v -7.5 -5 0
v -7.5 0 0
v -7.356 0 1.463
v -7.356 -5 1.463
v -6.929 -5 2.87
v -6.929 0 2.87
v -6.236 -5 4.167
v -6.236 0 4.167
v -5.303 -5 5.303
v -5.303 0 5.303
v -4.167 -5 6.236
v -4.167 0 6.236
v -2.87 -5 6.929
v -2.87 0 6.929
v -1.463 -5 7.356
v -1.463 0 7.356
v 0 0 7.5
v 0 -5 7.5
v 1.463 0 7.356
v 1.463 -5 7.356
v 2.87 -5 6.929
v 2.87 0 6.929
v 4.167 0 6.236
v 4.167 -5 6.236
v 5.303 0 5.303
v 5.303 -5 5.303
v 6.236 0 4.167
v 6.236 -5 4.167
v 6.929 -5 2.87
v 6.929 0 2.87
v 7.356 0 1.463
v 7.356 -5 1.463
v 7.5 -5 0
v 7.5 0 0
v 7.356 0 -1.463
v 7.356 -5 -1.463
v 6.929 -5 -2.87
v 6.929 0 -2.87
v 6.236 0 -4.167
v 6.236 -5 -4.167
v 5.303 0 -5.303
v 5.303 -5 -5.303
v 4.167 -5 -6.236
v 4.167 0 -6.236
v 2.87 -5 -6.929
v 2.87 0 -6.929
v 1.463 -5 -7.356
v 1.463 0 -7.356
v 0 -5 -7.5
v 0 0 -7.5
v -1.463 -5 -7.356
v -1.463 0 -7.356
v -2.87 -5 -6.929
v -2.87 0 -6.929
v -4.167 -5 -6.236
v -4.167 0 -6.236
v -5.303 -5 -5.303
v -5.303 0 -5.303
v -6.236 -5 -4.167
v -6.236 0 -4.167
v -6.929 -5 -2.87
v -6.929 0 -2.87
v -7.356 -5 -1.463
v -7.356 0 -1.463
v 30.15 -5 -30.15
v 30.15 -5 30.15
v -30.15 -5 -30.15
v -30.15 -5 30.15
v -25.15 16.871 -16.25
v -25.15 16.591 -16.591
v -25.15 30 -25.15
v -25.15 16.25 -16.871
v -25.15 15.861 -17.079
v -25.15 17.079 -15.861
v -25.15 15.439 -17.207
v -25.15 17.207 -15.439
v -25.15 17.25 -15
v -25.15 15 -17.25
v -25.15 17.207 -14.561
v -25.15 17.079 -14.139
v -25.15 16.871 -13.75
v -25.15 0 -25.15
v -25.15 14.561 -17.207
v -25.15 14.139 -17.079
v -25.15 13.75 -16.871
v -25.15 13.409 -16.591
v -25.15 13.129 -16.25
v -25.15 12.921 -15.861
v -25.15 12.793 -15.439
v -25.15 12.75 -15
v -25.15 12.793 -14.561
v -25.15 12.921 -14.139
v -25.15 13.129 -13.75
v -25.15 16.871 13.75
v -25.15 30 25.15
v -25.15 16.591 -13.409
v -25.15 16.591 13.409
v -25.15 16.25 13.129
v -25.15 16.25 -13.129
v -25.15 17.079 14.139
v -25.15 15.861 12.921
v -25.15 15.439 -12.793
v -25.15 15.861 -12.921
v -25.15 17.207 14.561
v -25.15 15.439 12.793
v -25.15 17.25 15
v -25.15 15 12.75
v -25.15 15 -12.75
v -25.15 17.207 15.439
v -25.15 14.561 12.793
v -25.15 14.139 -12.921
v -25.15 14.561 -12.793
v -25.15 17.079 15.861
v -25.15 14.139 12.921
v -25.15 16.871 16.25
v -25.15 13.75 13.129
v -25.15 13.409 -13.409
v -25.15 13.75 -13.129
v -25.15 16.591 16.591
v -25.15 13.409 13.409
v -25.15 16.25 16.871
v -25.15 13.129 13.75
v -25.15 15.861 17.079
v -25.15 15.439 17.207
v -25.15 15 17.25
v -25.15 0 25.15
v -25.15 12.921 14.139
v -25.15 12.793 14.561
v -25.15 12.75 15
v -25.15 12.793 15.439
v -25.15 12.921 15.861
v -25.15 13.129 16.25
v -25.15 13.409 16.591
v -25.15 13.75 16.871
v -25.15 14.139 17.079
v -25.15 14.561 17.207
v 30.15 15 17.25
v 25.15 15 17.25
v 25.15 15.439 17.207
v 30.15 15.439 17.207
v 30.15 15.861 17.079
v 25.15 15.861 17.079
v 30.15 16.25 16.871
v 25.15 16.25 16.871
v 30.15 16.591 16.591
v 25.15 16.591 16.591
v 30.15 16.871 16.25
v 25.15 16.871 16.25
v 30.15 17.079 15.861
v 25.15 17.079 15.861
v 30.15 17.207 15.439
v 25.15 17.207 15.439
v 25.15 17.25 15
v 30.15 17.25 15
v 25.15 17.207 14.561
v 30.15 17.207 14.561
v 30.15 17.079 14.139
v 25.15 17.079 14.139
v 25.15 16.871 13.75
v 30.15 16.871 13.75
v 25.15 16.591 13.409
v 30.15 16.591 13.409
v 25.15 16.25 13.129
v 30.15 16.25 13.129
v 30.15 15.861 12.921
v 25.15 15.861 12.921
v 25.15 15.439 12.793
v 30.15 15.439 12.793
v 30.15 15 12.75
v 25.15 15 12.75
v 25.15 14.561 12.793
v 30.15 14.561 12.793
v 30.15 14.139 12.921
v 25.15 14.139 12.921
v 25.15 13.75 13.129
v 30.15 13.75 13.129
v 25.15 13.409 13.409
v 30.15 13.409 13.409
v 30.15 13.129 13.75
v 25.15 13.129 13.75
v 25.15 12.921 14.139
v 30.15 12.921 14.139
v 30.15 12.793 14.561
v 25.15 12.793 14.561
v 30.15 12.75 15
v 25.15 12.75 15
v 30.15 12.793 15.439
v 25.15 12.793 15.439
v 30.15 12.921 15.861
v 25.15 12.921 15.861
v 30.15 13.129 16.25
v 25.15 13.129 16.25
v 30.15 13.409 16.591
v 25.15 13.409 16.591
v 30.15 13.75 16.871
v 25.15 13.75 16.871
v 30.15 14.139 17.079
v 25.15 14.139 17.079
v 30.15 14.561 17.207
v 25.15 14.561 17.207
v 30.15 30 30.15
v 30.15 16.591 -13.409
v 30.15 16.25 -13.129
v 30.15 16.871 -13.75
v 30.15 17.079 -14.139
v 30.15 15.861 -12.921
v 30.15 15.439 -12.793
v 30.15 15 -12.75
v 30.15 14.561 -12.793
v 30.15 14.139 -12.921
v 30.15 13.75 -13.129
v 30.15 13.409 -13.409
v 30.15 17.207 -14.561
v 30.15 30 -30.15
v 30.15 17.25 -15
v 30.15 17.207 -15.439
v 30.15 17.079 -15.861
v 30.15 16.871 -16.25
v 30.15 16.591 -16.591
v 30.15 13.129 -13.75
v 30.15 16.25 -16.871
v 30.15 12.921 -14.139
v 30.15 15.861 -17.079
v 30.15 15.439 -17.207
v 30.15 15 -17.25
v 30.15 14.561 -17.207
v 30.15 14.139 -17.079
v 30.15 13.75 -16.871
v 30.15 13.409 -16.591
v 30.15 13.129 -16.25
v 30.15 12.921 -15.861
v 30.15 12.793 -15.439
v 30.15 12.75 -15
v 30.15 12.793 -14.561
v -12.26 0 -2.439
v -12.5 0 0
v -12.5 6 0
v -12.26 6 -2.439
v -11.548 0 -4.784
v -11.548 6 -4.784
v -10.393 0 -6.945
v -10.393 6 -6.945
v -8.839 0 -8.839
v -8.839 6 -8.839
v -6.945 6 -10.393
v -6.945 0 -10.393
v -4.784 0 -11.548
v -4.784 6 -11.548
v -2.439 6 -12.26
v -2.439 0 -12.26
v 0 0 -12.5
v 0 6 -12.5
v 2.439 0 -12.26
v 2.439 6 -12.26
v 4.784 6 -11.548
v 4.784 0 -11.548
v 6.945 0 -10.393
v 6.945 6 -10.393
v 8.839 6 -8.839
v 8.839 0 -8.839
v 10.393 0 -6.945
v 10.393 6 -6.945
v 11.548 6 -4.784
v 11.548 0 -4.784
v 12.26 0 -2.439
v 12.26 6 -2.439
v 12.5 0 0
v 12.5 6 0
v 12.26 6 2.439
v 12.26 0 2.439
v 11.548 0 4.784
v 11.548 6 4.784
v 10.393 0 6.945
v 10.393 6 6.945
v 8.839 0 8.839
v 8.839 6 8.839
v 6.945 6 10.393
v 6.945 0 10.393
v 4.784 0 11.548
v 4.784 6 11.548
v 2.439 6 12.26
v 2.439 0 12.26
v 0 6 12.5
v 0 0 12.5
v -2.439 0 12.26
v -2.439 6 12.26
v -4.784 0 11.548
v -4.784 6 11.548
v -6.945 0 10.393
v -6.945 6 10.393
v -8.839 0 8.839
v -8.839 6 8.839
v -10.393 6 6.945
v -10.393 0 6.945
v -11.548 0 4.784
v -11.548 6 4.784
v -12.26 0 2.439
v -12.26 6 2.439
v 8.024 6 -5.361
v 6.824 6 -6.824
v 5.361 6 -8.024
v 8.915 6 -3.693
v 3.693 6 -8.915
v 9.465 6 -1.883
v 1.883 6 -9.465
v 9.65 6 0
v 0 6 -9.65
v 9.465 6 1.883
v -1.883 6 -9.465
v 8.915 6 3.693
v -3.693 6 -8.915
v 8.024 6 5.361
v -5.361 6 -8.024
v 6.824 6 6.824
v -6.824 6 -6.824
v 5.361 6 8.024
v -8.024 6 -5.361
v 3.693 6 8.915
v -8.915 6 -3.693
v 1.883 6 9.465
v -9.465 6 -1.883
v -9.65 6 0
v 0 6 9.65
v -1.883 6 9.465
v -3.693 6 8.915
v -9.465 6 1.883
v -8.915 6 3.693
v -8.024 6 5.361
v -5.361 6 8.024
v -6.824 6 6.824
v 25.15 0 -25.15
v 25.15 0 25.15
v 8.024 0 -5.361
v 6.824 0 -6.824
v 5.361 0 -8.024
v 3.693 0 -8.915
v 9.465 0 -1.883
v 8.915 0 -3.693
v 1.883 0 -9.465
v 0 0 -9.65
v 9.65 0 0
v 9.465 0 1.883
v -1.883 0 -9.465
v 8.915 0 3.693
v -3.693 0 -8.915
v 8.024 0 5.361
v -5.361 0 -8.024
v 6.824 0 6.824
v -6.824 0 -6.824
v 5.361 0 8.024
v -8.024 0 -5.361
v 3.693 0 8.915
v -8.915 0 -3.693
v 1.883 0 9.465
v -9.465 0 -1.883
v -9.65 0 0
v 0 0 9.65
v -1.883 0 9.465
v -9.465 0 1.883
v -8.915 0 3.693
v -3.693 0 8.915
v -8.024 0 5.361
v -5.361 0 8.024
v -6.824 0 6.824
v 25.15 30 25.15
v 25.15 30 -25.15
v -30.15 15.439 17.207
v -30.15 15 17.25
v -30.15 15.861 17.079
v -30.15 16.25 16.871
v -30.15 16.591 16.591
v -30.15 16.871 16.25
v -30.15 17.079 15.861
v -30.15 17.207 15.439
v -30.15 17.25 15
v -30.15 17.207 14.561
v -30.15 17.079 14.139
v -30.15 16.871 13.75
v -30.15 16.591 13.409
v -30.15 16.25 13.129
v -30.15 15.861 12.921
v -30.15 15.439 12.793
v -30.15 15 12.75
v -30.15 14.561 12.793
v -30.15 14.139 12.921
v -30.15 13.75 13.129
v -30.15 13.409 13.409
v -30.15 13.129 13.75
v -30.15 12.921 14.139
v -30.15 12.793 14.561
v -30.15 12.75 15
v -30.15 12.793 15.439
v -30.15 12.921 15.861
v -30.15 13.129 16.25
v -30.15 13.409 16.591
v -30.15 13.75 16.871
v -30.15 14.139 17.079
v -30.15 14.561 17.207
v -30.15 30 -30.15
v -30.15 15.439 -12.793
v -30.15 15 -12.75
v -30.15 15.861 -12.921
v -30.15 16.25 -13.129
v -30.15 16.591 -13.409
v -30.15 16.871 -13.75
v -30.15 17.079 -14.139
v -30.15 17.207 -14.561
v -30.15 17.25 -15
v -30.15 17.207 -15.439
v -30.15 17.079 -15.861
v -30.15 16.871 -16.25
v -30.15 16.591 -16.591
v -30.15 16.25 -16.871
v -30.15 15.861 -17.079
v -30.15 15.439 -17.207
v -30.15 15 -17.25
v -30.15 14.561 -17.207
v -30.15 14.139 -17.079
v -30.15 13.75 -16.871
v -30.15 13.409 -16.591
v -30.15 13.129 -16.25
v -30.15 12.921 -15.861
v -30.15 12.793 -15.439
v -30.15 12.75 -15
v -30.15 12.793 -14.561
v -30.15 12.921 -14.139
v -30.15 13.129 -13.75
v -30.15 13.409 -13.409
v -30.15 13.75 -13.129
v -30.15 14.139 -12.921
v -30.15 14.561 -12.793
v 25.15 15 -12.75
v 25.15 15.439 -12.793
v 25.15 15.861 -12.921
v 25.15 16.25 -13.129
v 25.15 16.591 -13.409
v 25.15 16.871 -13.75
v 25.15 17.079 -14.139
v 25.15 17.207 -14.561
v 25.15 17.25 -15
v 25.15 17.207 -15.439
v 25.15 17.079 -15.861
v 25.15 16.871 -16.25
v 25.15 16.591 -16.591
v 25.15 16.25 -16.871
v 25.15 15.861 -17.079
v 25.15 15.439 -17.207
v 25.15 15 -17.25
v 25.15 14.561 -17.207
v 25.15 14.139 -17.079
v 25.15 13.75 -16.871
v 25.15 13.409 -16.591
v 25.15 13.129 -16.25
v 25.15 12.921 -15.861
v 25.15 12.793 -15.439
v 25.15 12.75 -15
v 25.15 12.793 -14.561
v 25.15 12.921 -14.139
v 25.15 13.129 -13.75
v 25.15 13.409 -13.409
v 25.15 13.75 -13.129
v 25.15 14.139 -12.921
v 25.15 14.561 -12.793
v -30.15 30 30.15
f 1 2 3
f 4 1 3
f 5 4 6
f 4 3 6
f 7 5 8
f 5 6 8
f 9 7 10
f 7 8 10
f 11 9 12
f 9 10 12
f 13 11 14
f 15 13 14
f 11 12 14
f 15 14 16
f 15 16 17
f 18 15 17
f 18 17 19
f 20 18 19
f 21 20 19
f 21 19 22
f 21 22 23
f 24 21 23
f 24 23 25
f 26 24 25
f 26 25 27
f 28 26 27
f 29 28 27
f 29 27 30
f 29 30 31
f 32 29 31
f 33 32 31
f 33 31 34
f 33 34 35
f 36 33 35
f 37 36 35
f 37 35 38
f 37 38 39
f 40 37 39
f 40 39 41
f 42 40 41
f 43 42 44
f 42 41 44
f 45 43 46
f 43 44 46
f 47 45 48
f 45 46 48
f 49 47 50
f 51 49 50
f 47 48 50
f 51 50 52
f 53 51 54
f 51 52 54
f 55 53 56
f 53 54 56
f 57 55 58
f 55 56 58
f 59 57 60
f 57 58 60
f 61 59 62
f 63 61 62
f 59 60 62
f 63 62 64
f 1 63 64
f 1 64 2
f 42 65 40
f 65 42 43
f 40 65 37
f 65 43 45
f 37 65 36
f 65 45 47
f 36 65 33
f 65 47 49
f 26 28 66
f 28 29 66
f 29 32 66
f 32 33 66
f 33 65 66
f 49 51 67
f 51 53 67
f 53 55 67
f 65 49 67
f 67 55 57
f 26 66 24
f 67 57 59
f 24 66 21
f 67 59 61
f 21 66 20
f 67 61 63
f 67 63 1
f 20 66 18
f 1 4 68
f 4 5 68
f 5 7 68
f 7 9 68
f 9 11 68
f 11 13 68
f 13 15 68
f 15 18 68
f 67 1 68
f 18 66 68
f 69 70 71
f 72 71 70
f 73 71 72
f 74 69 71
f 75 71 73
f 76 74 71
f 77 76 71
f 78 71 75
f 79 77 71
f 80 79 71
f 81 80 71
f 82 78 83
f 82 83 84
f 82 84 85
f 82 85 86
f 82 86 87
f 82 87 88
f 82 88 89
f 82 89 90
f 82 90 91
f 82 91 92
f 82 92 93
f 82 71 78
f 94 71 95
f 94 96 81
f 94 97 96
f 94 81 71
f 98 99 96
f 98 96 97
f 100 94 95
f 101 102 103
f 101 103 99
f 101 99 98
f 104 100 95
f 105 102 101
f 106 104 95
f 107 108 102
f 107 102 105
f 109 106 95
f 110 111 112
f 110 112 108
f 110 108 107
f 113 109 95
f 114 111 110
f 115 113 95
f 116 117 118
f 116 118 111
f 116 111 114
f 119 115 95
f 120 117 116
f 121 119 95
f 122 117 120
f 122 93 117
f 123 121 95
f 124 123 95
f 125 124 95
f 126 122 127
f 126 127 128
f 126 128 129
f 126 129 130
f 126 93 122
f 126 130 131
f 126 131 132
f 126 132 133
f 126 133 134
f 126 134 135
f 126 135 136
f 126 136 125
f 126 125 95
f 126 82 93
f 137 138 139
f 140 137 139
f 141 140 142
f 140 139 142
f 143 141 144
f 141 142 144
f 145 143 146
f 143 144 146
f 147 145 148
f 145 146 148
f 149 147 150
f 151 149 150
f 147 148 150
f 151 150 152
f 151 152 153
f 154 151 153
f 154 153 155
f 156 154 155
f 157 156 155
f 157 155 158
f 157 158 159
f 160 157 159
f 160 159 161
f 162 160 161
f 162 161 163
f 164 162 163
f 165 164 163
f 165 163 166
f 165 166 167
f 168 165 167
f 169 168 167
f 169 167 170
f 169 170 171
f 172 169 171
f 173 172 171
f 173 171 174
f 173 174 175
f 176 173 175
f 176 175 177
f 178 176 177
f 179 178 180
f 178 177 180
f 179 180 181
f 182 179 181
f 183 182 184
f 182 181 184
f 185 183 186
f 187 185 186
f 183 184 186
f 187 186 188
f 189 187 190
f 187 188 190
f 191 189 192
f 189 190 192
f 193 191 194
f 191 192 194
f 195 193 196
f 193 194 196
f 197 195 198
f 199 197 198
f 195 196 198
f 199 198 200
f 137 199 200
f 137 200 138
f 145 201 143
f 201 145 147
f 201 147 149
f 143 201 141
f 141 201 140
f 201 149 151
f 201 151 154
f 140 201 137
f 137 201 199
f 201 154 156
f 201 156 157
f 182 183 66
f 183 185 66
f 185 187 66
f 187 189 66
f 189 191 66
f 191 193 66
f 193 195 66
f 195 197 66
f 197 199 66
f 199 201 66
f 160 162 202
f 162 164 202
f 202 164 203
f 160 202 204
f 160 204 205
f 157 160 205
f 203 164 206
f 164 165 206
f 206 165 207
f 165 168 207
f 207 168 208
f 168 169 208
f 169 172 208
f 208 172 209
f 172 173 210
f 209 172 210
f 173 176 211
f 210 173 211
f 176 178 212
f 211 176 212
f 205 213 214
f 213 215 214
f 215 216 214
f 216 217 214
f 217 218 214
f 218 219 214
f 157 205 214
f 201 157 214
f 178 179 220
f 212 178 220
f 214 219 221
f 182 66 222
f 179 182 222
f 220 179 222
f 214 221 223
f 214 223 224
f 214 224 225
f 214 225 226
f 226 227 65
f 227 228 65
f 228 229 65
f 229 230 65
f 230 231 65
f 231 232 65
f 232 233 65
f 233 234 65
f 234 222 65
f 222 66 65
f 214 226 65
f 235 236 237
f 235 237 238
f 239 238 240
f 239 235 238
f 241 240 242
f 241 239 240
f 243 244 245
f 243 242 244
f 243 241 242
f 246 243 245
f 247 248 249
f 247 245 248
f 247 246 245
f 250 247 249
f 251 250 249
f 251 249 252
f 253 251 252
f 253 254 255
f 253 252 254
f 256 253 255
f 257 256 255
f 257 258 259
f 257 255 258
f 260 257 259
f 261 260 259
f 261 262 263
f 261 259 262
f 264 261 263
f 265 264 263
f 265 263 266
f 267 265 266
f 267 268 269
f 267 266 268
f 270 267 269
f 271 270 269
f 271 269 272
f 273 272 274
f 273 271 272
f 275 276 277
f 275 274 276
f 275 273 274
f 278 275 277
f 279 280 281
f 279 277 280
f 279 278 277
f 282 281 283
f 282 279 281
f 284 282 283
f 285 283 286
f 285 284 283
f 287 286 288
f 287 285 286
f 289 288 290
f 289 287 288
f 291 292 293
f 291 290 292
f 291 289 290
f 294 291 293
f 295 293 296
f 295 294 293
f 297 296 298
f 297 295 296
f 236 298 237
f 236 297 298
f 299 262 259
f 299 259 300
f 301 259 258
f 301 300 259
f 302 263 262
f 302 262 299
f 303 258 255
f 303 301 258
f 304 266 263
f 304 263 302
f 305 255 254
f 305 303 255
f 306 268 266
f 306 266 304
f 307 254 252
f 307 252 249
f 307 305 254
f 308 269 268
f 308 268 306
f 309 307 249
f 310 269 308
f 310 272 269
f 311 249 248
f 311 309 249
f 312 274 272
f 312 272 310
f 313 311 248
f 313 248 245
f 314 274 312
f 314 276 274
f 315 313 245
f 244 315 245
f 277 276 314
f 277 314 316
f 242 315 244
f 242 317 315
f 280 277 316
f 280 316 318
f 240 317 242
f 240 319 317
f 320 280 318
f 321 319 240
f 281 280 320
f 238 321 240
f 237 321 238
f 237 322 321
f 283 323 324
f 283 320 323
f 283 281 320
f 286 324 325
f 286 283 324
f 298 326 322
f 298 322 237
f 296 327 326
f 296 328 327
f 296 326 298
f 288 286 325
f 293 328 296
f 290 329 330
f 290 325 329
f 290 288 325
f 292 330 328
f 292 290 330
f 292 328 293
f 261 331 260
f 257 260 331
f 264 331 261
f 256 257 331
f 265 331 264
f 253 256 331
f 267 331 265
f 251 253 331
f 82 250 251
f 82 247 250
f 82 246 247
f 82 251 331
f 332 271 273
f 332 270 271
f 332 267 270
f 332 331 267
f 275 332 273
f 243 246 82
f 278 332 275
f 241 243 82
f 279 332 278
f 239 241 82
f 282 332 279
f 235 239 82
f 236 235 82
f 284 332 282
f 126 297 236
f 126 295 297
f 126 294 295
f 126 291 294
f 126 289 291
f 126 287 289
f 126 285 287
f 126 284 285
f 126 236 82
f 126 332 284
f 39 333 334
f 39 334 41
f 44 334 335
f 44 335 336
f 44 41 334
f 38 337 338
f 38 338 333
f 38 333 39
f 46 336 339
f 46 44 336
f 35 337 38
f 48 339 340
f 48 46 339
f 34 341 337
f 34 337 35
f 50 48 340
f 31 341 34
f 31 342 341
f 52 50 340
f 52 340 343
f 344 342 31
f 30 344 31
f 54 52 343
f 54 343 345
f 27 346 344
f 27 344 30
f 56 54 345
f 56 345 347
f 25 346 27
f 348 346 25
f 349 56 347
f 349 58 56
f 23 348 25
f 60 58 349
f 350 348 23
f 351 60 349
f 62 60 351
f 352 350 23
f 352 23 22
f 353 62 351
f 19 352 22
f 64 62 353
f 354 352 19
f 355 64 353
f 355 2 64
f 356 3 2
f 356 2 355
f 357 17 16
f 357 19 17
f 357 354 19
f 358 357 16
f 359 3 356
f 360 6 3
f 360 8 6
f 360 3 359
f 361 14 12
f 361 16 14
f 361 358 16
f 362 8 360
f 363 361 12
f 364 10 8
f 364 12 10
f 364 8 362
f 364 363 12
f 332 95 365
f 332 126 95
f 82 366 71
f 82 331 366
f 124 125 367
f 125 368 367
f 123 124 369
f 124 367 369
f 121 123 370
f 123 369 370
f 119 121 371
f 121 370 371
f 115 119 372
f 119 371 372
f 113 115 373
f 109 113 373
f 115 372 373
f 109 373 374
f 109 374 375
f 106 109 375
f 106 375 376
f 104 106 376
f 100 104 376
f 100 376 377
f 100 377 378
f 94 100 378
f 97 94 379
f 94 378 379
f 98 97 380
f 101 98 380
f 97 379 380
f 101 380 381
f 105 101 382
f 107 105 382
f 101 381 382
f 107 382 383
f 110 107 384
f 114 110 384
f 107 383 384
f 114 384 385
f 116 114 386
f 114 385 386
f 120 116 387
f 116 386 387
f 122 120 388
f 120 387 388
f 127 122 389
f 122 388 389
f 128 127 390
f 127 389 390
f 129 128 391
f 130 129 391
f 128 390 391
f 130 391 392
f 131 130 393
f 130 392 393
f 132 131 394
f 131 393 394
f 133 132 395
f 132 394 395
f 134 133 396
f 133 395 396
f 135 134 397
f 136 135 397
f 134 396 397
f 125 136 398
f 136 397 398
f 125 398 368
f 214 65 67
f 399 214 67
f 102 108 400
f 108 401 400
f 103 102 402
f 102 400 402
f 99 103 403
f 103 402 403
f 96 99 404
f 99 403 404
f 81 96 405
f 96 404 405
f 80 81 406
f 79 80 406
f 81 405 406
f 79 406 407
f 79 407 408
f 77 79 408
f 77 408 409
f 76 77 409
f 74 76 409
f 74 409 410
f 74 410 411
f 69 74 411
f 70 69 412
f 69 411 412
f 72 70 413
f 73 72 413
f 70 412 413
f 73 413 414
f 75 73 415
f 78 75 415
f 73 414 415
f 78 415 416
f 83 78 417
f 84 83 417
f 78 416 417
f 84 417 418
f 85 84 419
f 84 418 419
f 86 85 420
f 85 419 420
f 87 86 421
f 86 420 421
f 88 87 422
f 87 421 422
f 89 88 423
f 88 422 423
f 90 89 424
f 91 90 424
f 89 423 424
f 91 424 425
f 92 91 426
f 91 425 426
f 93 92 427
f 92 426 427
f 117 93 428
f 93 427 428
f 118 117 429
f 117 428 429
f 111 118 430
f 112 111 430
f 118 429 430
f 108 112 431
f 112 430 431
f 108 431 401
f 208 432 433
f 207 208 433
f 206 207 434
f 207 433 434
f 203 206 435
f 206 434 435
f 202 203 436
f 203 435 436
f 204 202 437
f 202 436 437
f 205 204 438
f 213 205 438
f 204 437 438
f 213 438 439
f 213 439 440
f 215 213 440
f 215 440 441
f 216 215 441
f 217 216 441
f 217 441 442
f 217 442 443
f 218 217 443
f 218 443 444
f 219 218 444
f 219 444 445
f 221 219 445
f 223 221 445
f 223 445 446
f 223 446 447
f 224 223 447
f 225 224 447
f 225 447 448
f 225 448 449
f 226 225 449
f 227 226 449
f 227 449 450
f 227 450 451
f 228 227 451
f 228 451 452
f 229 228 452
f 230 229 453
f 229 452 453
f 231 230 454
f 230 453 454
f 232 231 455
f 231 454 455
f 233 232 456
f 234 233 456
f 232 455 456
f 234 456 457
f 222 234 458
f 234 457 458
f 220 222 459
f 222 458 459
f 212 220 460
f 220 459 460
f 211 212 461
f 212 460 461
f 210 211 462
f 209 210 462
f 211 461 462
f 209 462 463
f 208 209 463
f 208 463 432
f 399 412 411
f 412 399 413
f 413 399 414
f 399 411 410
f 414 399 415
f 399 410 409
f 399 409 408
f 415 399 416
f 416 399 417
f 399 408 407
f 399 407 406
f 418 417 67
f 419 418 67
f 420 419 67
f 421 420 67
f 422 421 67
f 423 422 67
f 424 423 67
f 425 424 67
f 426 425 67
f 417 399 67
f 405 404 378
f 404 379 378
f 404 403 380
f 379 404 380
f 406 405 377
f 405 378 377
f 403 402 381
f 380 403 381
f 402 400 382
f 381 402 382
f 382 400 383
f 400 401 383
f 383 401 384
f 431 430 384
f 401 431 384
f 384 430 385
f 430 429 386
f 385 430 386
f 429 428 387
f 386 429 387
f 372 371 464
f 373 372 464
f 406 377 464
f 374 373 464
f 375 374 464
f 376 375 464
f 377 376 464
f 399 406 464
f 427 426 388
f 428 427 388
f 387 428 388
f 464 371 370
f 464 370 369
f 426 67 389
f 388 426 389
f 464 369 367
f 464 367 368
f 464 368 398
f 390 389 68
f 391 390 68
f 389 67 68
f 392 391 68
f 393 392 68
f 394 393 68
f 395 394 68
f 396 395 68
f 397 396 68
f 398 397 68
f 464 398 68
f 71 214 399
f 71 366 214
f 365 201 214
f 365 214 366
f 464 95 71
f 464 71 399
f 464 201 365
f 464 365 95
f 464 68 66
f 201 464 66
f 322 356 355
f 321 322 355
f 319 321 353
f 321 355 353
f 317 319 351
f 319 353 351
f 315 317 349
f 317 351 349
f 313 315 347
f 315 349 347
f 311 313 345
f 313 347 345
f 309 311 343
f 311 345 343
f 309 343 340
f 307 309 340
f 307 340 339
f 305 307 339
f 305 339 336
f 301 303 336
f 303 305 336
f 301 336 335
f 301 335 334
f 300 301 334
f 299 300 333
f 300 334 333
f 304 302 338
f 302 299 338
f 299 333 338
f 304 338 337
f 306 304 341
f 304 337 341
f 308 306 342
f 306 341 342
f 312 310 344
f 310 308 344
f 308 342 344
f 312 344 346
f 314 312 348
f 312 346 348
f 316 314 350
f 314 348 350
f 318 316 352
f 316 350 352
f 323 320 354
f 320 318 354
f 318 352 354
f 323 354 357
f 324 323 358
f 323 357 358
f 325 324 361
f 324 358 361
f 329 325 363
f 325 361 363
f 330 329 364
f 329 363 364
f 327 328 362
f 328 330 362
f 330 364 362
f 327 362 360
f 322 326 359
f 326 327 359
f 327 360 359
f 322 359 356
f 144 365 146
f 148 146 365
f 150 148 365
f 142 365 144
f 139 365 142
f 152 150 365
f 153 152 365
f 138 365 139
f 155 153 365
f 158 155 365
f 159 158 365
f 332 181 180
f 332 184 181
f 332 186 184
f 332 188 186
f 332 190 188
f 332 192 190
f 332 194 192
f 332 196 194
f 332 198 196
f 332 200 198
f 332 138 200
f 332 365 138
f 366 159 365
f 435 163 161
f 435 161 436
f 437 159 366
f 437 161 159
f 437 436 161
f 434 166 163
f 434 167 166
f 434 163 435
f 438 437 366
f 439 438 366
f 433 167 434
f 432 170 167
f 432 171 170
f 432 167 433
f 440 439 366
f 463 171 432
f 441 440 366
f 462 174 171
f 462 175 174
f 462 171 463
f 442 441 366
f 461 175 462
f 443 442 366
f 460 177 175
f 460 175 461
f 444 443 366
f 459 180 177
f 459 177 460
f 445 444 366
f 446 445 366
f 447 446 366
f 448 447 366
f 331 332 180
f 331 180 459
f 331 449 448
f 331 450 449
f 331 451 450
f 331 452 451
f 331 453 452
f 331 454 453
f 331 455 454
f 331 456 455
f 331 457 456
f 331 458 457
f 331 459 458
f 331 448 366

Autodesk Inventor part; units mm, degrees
ref_plane "YZ Plane" through (0, 0, 0) normal (1, 0, 0) x (0, 1, 0)
ref_plane "XZ Plane" through (0, 0, 0) normal (0, 1, 0) x (-1, 0, 0)
ref_plane "XY Plane" through (0, 0, 0) normal (0, 0, 1) x (1, 0, 0)
sketch "Sketch1" plane through (0, 0, 0) normal (0, 1, 0) x (-1, 0, 0)
  line L0 (25.15, 25.15) -> (-25.15, 25.15)
  line L1 (-25.15, 25.15) -> (-25.15, -25.15)
  line L2 (-25.15, -25.15) -> (25.15, -25.15)
  line L3 (25.15, -25.15) -> (25.15, 25.15)
  line L4 (25.15, 25.15) -> (-25.15, -25.15) construction
  line L5 (-25.15, 25.15) -> (25.15, -25.15) construction
  line L6 (30.15, 30.15) -> (-30.15, 30.15)
  line L7 (-30.15, 30.15) -> (-30.15, -30.15)
  line L8 (-30.15, -30.15) -> (30.15, -30.15)
  line L9 (30.15, -30.15) -> (30.15, 30.15)
  line L10 (30.15, 30.15) -> (-30.15, -30.15) construction
  line L11 (-30.15, 30.15) -> (30.15, -30.15) construction
  circle A0 centre (0, 0) radius 7.5
  circle A1 centre (0, 0) radius 9.65
  circle A2 centre (0, 0) radius 12.5
  line L12 (0, 0) -> (25.15, 0) construction
  line L13 (0, 0) -> (0, -25.15) construction
  dimension "d1" = 50.3
  dimension "d3" = 60.3
  dimension "d8" = 15
  dimension "d9" = 19.3
  dimension "d10" = 25
extrude "Extrusion1" add sketch "Sketch1" along normal blind 30 contours L9 L8 L7 L6
extrude "Extrusion2" add sketch "Sketch1" against normal blind 5 contours L3 L2 L1 L0 | L9 L8 L7 L6 | A1 | A2
extrude "Extrusion3" add sketch "Sketch1" along normal blind 6 contours A2
sketch "Sketch2" plane through (-30.15, 30, -30.15) normal (-1, 0, 0) x (0, 0, 1)
  line L0 (60.3, 0) -> (60.3, -35) construction
  line L1 (0, -35) -> (0, 0) construction
  circle A0 centre (45.15, -15) radius 2.25
  line L2 (30.15, -15) -> (45.15, -15) construction
  line L3 (30.15, -15) -> (15.15, -15) construction
  circle A1 centre (15.15, -15) radius 2.25
  line L4 (60.3, 0) -> (0, 0)
  line L5 (0, 0) -> (0, -30)
  line L6 (0, -30) -> (60.3, -30)
  line L7 (60.3, -30) -> (60.3, 0)
  line L8 (60.3, 0) -> (0, -30) construction
  line L9 (30.15, -15) -> (25.1861, -9.3551) construction
  point P0 (30.15, -30)
  dimension "d13" = 4.5
  dimension "d16" = 15
  dimension "d17" = 15
  dimension "d18" = 4.5
  dimension "d19" = 30
extrude "Extrusion4" cut sketch "Sketch2" against normal blind 65 contours A0 | A1
properties material "PBT Plastic"
